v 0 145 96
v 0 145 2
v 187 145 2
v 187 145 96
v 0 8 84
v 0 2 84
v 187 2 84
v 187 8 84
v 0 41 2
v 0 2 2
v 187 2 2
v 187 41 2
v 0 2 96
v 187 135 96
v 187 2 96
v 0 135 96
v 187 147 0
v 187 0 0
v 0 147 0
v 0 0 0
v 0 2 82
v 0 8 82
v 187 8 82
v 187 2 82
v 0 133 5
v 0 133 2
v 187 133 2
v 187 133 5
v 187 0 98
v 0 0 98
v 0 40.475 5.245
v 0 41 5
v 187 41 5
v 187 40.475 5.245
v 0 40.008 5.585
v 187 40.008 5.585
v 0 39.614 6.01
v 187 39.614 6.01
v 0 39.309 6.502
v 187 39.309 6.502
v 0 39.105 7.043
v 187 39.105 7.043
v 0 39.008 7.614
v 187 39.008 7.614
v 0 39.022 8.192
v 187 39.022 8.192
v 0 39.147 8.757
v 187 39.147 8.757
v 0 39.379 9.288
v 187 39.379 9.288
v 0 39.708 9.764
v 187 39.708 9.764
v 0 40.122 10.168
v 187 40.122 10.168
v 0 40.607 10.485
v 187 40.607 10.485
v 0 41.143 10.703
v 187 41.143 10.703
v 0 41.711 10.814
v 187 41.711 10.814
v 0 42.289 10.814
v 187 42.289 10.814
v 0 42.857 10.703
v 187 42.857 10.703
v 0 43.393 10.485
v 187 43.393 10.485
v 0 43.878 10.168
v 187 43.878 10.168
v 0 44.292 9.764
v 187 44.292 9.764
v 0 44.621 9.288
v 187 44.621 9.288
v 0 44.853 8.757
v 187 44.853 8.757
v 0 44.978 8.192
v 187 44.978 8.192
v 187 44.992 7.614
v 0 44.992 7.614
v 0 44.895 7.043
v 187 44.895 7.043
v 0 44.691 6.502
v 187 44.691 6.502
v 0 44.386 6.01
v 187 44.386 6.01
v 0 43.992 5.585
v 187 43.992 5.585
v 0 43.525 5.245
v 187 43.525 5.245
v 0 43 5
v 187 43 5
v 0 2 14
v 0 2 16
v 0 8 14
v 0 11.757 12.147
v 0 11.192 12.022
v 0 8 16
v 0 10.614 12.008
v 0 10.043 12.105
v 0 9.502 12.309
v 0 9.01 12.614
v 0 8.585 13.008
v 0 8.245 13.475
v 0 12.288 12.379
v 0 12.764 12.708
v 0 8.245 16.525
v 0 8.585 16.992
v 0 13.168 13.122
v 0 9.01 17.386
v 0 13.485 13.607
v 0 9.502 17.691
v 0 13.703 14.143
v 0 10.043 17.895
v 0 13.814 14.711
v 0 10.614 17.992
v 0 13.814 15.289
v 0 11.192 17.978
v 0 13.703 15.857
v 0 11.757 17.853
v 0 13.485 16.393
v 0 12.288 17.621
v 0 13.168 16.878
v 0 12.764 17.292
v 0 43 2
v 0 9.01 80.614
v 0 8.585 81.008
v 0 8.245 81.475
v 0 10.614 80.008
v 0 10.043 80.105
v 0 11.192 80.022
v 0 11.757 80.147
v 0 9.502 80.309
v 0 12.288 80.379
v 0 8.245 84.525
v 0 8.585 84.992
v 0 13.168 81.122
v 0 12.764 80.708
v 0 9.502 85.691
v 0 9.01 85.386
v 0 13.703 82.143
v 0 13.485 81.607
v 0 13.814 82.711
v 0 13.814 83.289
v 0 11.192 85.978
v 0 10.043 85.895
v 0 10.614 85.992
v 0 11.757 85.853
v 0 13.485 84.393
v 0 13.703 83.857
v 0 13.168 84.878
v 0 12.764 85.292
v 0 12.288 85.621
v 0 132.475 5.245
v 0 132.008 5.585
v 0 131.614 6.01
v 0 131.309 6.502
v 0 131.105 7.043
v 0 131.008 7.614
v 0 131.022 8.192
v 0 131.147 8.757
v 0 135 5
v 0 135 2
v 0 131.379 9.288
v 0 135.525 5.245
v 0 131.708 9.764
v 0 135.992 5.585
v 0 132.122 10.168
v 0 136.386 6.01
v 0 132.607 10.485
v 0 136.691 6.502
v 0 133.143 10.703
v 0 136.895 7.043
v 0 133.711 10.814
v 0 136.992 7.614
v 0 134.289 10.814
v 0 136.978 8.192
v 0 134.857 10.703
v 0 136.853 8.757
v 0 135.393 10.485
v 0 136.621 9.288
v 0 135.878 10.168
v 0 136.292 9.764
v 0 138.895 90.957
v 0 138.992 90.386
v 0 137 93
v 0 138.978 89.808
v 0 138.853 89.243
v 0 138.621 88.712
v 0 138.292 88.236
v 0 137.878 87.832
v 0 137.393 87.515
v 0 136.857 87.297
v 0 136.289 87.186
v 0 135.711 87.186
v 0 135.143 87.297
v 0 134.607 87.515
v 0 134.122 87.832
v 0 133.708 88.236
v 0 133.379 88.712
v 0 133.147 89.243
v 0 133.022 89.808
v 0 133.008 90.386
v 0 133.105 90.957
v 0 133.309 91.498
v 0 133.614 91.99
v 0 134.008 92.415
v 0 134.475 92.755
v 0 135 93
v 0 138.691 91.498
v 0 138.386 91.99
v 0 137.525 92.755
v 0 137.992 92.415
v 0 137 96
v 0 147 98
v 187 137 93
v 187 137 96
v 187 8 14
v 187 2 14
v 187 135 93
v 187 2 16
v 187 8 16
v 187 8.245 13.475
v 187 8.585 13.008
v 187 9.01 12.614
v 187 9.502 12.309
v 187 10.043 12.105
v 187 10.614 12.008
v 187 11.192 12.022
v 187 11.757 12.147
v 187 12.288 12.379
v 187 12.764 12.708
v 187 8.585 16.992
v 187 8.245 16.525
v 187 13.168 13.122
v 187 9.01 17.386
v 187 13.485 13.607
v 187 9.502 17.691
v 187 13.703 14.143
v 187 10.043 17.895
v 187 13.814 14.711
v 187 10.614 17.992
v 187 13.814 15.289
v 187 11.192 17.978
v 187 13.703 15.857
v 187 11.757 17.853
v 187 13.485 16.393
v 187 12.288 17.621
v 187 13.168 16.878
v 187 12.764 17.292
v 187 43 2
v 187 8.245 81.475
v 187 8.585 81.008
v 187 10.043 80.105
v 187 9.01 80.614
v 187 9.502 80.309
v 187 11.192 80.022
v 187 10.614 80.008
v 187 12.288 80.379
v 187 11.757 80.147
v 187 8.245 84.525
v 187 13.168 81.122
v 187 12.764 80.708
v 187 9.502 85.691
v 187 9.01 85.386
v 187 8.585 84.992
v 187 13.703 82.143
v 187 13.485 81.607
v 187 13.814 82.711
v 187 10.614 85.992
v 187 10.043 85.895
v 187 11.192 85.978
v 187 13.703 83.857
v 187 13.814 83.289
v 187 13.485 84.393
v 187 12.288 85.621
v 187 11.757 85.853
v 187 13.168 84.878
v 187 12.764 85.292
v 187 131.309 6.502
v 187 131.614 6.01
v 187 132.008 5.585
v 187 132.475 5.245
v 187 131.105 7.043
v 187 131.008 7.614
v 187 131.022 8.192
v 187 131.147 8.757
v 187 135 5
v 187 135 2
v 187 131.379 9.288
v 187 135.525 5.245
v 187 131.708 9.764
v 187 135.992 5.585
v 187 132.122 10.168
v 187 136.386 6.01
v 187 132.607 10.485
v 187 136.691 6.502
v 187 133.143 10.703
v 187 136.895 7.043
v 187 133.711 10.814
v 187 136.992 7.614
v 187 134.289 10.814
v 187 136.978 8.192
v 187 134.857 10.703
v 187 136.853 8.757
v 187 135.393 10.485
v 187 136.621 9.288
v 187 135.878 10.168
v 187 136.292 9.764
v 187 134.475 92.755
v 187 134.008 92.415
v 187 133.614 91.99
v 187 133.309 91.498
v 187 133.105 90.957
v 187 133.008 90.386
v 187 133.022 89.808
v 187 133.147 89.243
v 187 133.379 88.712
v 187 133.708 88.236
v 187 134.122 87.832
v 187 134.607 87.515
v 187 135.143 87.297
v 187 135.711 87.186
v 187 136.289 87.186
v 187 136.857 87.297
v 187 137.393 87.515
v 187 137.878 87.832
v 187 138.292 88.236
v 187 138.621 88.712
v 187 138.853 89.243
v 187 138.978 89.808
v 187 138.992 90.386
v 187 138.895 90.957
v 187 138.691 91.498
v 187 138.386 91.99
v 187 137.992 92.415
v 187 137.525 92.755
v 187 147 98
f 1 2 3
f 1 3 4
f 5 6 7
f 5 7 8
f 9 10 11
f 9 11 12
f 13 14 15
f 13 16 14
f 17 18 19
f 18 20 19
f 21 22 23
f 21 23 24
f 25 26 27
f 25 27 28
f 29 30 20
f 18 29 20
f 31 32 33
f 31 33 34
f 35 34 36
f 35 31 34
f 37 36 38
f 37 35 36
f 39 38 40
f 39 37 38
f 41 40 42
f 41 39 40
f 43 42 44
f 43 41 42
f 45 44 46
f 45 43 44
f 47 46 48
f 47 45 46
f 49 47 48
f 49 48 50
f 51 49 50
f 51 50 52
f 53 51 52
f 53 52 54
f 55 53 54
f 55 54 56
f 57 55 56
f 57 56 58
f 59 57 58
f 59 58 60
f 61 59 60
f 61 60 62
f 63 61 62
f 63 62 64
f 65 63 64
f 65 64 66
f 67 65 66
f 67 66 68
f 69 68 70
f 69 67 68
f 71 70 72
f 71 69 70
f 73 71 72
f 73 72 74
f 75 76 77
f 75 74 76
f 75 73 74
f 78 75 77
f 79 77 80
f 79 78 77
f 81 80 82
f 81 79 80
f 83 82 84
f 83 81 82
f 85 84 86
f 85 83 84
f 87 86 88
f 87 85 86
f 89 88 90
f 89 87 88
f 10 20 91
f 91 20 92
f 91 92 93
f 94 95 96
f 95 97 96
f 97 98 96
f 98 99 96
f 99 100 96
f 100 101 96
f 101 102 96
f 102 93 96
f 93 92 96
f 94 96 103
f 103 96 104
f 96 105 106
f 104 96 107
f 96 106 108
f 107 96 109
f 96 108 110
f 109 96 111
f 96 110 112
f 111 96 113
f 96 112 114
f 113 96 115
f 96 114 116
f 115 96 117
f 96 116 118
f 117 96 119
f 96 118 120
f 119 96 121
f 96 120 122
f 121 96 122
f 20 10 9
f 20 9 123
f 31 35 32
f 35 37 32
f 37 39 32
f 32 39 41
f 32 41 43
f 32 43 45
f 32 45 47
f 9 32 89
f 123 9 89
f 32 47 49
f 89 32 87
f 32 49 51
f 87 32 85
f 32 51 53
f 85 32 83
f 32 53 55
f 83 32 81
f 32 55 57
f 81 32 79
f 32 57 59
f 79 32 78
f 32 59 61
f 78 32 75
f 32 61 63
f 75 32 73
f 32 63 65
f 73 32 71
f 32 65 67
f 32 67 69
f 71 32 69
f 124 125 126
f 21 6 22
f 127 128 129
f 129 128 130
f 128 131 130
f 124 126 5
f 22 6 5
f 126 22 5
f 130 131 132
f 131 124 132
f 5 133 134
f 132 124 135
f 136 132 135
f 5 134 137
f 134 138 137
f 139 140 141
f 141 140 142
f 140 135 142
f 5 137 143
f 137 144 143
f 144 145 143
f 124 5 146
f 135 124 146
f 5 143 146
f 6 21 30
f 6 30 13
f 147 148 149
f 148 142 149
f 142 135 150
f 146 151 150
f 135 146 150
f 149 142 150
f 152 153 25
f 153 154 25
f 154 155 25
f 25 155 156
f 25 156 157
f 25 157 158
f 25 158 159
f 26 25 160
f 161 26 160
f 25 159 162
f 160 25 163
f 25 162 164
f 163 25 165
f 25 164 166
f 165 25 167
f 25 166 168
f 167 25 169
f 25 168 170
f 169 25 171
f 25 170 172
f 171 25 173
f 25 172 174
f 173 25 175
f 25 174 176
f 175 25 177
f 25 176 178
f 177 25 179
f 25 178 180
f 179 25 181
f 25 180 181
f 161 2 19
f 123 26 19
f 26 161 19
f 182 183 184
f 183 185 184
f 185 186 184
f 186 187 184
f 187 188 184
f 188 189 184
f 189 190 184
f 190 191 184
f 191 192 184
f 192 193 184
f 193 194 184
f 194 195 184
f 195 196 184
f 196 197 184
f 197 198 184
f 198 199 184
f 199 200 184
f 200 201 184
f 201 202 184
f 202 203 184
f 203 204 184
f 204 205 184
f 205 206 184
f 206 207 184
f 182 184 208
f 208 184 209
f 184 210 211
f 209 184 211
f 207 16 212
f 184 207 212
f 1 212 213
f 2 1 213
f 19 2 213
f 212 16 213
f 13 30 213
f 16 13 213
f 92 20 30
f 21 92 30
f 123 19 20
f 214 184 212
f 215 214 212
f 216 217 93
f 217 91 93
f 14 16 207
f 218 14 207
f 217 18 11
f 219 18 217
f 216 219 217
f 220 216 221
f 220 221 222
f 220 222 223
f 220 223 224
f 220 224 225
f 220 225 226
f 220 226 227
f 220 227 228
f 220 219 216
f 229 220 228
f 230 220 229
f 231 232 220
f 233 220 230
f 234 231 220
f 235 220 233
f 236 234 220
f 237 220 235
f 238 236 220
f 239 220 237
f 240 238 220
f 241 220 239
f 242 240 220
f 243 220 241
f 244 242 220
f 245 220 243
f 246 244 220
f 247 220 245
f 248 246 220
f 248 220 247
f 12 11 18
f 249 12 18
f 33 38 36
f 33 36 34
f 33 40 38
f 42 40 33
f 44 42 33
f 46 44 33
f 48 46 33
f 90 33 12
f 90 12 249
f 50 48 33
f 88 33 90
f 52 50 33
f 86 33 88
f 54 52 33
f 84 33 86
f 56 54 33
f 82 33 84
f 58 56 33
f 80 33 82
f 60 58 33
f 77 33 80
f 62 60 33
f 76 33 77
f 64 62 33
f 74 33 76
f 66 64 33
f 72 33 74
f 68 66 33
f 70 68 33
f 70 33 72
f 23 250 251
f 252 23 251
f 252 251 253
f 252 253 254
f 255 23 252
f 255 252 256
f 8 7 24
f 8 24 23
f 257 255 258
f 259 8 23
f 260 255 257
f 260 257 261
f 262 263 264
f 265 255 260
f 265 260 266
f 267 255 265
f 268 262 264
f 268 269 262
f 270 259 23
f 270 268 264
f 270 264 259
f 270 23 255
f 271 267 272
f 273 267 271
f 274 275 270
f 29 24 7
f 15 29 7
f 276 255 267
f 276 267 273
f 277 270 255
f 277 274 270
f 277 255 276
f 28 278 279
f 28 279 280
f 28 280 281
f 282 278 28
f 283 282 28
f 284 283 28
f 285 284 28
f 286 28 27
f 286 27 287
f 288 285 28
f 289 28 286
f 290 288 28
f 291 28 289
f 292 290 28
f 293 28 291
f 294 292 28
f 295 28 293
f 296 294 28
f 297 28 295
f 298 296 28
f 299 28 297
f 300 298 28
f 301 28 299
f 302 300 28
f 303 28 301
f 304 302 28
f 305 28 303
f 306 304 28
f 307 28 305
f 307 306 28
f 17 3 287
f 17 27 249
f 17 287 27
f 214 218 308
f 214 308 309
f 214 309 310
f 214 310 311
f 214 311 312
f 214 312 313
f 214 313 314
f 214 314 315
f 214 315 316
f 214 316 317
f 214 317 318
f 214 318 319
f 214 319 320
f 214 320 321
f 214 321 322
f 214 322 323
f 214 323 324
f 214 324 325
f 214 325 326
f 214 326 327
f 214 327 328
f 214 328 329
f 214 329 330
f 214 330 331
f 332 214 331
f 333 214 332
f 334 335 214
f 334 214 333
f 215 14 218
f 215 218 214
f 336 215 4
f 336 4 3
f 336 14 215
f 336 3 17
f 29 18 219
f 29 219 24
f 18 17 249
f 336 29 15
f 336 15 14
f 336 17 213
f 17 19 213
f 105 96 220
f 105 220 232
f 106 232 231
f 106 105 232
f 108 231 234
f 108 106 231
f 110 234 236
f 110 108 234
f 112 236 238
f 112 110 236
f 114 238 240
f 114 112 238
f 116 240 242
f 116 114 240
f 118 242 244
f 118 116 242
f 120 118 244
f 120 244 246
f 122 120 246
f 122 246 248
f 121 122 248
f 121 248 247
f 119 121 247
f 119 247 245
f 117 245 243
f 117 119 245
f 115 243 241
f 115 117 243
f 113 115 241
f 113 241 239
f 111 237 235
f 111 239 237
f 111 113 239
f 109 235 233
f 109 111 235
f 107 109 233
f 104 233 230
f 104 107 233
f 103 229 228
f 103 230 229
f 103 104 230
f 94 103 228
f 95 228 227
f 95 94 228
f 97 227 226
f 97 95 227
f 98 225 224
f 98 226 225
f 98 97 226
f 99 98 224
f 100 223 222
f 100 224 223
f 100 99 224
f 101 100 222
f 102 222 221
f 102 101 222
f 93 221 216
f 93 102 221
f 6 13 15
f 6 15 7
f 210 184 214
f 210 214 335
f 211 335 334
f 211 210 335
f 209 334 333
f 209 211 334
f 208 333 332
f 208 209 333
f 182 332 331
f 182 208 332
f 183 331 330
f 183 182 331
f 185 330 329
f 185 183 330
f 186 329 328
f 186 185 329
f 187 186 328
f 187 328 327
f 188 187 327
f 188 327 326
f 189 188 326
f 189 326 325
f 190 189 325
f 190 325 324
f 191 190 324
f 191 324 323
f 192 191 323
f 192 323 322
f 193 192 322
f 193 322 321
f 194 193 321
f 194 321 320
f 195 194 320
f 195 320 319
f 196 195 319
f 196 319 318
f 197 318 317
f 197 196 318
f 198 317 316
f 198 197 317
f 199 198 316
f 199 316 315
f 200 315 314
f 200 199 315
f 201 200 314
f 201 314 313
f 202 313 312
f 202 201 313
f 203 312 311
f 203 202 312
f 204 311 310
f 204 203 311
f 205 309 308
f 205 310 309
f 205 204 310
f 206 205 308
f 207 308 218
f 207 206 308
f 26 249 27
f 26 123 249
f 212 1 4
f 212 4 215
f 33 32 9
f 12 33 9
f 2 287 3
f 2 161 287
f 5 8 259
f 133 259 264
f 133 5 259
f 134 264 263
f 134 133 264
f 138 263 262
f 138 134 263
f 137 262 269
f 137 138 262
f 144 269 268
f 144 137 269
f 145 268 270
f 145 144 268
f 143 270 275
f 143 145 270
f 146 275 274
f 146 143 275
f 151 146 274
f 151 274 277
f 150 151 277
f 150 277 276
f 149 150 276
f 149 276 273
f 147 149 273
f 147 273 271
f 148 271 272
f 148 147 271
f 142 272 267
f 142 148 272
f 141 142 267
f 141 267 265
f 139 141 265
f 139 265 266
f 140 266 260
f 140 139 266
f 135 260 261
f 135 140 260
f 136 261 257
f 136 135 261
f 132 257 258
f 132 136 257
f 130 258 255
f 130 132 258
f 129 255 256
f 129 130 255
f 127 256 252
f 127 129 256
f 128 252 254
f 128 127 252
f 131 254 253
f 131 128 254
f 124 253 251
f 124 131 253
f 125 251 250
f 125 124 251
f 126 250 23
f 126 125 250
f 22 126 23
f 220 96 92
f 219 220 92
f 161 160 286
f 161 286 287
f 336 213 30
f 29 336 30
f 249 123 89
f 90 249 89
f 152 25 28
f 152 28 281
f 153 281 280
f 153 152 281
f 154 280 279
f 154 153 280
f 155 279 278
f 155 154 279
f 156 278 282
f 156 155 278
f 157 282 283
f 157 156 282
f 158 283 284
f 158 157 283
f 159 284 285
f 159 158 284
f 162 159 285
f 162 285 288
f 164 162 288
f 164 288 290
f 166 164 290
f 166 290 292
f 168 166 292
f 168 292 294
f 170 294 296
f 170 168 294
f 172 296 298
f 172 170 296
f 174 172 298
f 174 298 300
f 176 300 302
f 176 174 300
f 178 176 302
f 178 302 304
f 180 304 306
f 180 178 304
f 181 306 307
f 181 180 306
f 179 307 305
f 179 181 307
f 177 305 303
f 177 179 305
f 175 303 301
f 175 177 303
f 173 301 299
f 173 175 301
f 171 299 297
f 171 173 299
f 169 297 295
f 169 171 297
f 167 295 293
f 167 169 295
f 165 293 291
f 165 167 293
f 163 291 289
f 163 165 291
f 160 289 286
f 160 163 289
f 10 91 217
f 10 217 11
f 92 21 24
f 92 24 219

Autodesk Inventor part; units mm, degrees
ref_plane "YZ Plane" through (0, 0, 0) normal (1, 0, 0) x (0, 1, 0)
ref_plane "XZ Plane" through (0, 0, 0) normal (0, 1, 0) x (-1, 0, 0)
ref_plane "XY Plane" through (0, 0, 0) normal (0, 0, 1) x (1, 0, 0)
sketch "Sketch1" plane through (0, 0, 0) normal (1, 0, 0) x (0, 1, 0)
  line L0 (0, 0) -> (147, 0)
  line L1 (147, 0) -> (147, 98)
  line L2 (147, 98) -> (0, 98)
  line L3 (0, 98) -> (0, 0)
  line L4 (2, 2) -> (145, 2)
  line L5 (145, 2) -> (145, 96)
  line L6 (145, 96) -> (2, 96)
  line L7 (2, 96) -> (2, 2)
  line L8 (137, 96) -> (135, 96)
  line L9 (135, 96) -> (135, 93)
  line L10 (135, 93) -> (137, 93)
  line L11 (137, 93) -> (137, 96)
  circle A0 centre (136, 90.1716) radius 3
  line L12 (135, 2) -> (133, 2)
  line L13 (133, 2) -> (133, 5)
  line L14 (133, 5) -> (135, 5)
  line L15 (135, 5) -> (135, 2)
  circle A1 centre (134, 7.8284) radius 3
  line L16 (2, 84) -> (8, 84)
  line L17 (8, 84) -> (8, 82)
  line L18 (8, 82) -> (2, 82)
  line L19 (2, 82) -> (2, 84)
  line L20 (2, 14) -> (8, 14)
  line L21 (8, 14) -> (8, 16)
  line L22 (8, 16) -> (2, 16)
  line L23 (2, 16) -> (2, 14)
  line L24 (41, 2) -> (43, 2)
  line L25 (43, 2) -> (43, 5)
  line L26 (43, 5) -> (41, 5)
  line L27 (41, 5) -> (41, 2)
  circle A2 centre (10.8284, 83) radius 3
  circle A3 centre (10.8284, 15) radius 3
  circle A4 centre (42, 7.8284) radius 3
  point P0 (2, 16)
  dimension "d36" = 2
  dimension "d37" = 2
  dimension "d38" = 2
  dimension "d39" = 2
  dimension "d40" = 98
  dimension "d41" = 147
  dimension "d42" = 2
  dimension "d43" = 3
  dimension "d44" = 6
  dimension "d45" = 11
  dimension "d46" = 3
  dimension "d47" = 2
  dimension "d48" = 6
  dimension "d49" = 11
  dimension "d50" = 2
  dimension "d51" = 2
  dimension "d52" = 6
  dimension "d53" = 2
  dimension "d54" = 3
  dimension "d55" = 6
  dimension "d56" = 6
  dimension "d57" = 6
  dimension "d58" = 15
  dimension "d60" = 15
  dimension "d61" = 42
extrude "Extrusion1" add sketch "Sketch1" along normal blind 187 contours L3 L2 L1 L0 | L27 A4 L25 L4 | L7 L22 A3 L20 | A4 L26 | L26 A4 | A3 L21 | L21 A3 | L13 A1 L15 L4 | L7 L16 A2 L18 | A1 L14 | L14 A1 | A2 L17 | L17 A2 | L6 L11 A0 L9 | A0 L10 | L10 A0
equation "\"d37\" = d36"
equation "\"d38\" = d36"
equation "\"d39\" = d36"
equation "\"d46\" = d43"
equation "\"d47\" = d42"
equation "\"d48\" = d44"
equation "\"d49\" = d45"
equation "\"d50\" = d42"
equation "\"d51\" = d42"
equation "\"d53\" = d42"
equation "\"d54\" = d43"
equation "\"d55\" = d44"
equation "\"d56\" = d44"
equation "\"d57\" = d44"
properties part number "shell"
